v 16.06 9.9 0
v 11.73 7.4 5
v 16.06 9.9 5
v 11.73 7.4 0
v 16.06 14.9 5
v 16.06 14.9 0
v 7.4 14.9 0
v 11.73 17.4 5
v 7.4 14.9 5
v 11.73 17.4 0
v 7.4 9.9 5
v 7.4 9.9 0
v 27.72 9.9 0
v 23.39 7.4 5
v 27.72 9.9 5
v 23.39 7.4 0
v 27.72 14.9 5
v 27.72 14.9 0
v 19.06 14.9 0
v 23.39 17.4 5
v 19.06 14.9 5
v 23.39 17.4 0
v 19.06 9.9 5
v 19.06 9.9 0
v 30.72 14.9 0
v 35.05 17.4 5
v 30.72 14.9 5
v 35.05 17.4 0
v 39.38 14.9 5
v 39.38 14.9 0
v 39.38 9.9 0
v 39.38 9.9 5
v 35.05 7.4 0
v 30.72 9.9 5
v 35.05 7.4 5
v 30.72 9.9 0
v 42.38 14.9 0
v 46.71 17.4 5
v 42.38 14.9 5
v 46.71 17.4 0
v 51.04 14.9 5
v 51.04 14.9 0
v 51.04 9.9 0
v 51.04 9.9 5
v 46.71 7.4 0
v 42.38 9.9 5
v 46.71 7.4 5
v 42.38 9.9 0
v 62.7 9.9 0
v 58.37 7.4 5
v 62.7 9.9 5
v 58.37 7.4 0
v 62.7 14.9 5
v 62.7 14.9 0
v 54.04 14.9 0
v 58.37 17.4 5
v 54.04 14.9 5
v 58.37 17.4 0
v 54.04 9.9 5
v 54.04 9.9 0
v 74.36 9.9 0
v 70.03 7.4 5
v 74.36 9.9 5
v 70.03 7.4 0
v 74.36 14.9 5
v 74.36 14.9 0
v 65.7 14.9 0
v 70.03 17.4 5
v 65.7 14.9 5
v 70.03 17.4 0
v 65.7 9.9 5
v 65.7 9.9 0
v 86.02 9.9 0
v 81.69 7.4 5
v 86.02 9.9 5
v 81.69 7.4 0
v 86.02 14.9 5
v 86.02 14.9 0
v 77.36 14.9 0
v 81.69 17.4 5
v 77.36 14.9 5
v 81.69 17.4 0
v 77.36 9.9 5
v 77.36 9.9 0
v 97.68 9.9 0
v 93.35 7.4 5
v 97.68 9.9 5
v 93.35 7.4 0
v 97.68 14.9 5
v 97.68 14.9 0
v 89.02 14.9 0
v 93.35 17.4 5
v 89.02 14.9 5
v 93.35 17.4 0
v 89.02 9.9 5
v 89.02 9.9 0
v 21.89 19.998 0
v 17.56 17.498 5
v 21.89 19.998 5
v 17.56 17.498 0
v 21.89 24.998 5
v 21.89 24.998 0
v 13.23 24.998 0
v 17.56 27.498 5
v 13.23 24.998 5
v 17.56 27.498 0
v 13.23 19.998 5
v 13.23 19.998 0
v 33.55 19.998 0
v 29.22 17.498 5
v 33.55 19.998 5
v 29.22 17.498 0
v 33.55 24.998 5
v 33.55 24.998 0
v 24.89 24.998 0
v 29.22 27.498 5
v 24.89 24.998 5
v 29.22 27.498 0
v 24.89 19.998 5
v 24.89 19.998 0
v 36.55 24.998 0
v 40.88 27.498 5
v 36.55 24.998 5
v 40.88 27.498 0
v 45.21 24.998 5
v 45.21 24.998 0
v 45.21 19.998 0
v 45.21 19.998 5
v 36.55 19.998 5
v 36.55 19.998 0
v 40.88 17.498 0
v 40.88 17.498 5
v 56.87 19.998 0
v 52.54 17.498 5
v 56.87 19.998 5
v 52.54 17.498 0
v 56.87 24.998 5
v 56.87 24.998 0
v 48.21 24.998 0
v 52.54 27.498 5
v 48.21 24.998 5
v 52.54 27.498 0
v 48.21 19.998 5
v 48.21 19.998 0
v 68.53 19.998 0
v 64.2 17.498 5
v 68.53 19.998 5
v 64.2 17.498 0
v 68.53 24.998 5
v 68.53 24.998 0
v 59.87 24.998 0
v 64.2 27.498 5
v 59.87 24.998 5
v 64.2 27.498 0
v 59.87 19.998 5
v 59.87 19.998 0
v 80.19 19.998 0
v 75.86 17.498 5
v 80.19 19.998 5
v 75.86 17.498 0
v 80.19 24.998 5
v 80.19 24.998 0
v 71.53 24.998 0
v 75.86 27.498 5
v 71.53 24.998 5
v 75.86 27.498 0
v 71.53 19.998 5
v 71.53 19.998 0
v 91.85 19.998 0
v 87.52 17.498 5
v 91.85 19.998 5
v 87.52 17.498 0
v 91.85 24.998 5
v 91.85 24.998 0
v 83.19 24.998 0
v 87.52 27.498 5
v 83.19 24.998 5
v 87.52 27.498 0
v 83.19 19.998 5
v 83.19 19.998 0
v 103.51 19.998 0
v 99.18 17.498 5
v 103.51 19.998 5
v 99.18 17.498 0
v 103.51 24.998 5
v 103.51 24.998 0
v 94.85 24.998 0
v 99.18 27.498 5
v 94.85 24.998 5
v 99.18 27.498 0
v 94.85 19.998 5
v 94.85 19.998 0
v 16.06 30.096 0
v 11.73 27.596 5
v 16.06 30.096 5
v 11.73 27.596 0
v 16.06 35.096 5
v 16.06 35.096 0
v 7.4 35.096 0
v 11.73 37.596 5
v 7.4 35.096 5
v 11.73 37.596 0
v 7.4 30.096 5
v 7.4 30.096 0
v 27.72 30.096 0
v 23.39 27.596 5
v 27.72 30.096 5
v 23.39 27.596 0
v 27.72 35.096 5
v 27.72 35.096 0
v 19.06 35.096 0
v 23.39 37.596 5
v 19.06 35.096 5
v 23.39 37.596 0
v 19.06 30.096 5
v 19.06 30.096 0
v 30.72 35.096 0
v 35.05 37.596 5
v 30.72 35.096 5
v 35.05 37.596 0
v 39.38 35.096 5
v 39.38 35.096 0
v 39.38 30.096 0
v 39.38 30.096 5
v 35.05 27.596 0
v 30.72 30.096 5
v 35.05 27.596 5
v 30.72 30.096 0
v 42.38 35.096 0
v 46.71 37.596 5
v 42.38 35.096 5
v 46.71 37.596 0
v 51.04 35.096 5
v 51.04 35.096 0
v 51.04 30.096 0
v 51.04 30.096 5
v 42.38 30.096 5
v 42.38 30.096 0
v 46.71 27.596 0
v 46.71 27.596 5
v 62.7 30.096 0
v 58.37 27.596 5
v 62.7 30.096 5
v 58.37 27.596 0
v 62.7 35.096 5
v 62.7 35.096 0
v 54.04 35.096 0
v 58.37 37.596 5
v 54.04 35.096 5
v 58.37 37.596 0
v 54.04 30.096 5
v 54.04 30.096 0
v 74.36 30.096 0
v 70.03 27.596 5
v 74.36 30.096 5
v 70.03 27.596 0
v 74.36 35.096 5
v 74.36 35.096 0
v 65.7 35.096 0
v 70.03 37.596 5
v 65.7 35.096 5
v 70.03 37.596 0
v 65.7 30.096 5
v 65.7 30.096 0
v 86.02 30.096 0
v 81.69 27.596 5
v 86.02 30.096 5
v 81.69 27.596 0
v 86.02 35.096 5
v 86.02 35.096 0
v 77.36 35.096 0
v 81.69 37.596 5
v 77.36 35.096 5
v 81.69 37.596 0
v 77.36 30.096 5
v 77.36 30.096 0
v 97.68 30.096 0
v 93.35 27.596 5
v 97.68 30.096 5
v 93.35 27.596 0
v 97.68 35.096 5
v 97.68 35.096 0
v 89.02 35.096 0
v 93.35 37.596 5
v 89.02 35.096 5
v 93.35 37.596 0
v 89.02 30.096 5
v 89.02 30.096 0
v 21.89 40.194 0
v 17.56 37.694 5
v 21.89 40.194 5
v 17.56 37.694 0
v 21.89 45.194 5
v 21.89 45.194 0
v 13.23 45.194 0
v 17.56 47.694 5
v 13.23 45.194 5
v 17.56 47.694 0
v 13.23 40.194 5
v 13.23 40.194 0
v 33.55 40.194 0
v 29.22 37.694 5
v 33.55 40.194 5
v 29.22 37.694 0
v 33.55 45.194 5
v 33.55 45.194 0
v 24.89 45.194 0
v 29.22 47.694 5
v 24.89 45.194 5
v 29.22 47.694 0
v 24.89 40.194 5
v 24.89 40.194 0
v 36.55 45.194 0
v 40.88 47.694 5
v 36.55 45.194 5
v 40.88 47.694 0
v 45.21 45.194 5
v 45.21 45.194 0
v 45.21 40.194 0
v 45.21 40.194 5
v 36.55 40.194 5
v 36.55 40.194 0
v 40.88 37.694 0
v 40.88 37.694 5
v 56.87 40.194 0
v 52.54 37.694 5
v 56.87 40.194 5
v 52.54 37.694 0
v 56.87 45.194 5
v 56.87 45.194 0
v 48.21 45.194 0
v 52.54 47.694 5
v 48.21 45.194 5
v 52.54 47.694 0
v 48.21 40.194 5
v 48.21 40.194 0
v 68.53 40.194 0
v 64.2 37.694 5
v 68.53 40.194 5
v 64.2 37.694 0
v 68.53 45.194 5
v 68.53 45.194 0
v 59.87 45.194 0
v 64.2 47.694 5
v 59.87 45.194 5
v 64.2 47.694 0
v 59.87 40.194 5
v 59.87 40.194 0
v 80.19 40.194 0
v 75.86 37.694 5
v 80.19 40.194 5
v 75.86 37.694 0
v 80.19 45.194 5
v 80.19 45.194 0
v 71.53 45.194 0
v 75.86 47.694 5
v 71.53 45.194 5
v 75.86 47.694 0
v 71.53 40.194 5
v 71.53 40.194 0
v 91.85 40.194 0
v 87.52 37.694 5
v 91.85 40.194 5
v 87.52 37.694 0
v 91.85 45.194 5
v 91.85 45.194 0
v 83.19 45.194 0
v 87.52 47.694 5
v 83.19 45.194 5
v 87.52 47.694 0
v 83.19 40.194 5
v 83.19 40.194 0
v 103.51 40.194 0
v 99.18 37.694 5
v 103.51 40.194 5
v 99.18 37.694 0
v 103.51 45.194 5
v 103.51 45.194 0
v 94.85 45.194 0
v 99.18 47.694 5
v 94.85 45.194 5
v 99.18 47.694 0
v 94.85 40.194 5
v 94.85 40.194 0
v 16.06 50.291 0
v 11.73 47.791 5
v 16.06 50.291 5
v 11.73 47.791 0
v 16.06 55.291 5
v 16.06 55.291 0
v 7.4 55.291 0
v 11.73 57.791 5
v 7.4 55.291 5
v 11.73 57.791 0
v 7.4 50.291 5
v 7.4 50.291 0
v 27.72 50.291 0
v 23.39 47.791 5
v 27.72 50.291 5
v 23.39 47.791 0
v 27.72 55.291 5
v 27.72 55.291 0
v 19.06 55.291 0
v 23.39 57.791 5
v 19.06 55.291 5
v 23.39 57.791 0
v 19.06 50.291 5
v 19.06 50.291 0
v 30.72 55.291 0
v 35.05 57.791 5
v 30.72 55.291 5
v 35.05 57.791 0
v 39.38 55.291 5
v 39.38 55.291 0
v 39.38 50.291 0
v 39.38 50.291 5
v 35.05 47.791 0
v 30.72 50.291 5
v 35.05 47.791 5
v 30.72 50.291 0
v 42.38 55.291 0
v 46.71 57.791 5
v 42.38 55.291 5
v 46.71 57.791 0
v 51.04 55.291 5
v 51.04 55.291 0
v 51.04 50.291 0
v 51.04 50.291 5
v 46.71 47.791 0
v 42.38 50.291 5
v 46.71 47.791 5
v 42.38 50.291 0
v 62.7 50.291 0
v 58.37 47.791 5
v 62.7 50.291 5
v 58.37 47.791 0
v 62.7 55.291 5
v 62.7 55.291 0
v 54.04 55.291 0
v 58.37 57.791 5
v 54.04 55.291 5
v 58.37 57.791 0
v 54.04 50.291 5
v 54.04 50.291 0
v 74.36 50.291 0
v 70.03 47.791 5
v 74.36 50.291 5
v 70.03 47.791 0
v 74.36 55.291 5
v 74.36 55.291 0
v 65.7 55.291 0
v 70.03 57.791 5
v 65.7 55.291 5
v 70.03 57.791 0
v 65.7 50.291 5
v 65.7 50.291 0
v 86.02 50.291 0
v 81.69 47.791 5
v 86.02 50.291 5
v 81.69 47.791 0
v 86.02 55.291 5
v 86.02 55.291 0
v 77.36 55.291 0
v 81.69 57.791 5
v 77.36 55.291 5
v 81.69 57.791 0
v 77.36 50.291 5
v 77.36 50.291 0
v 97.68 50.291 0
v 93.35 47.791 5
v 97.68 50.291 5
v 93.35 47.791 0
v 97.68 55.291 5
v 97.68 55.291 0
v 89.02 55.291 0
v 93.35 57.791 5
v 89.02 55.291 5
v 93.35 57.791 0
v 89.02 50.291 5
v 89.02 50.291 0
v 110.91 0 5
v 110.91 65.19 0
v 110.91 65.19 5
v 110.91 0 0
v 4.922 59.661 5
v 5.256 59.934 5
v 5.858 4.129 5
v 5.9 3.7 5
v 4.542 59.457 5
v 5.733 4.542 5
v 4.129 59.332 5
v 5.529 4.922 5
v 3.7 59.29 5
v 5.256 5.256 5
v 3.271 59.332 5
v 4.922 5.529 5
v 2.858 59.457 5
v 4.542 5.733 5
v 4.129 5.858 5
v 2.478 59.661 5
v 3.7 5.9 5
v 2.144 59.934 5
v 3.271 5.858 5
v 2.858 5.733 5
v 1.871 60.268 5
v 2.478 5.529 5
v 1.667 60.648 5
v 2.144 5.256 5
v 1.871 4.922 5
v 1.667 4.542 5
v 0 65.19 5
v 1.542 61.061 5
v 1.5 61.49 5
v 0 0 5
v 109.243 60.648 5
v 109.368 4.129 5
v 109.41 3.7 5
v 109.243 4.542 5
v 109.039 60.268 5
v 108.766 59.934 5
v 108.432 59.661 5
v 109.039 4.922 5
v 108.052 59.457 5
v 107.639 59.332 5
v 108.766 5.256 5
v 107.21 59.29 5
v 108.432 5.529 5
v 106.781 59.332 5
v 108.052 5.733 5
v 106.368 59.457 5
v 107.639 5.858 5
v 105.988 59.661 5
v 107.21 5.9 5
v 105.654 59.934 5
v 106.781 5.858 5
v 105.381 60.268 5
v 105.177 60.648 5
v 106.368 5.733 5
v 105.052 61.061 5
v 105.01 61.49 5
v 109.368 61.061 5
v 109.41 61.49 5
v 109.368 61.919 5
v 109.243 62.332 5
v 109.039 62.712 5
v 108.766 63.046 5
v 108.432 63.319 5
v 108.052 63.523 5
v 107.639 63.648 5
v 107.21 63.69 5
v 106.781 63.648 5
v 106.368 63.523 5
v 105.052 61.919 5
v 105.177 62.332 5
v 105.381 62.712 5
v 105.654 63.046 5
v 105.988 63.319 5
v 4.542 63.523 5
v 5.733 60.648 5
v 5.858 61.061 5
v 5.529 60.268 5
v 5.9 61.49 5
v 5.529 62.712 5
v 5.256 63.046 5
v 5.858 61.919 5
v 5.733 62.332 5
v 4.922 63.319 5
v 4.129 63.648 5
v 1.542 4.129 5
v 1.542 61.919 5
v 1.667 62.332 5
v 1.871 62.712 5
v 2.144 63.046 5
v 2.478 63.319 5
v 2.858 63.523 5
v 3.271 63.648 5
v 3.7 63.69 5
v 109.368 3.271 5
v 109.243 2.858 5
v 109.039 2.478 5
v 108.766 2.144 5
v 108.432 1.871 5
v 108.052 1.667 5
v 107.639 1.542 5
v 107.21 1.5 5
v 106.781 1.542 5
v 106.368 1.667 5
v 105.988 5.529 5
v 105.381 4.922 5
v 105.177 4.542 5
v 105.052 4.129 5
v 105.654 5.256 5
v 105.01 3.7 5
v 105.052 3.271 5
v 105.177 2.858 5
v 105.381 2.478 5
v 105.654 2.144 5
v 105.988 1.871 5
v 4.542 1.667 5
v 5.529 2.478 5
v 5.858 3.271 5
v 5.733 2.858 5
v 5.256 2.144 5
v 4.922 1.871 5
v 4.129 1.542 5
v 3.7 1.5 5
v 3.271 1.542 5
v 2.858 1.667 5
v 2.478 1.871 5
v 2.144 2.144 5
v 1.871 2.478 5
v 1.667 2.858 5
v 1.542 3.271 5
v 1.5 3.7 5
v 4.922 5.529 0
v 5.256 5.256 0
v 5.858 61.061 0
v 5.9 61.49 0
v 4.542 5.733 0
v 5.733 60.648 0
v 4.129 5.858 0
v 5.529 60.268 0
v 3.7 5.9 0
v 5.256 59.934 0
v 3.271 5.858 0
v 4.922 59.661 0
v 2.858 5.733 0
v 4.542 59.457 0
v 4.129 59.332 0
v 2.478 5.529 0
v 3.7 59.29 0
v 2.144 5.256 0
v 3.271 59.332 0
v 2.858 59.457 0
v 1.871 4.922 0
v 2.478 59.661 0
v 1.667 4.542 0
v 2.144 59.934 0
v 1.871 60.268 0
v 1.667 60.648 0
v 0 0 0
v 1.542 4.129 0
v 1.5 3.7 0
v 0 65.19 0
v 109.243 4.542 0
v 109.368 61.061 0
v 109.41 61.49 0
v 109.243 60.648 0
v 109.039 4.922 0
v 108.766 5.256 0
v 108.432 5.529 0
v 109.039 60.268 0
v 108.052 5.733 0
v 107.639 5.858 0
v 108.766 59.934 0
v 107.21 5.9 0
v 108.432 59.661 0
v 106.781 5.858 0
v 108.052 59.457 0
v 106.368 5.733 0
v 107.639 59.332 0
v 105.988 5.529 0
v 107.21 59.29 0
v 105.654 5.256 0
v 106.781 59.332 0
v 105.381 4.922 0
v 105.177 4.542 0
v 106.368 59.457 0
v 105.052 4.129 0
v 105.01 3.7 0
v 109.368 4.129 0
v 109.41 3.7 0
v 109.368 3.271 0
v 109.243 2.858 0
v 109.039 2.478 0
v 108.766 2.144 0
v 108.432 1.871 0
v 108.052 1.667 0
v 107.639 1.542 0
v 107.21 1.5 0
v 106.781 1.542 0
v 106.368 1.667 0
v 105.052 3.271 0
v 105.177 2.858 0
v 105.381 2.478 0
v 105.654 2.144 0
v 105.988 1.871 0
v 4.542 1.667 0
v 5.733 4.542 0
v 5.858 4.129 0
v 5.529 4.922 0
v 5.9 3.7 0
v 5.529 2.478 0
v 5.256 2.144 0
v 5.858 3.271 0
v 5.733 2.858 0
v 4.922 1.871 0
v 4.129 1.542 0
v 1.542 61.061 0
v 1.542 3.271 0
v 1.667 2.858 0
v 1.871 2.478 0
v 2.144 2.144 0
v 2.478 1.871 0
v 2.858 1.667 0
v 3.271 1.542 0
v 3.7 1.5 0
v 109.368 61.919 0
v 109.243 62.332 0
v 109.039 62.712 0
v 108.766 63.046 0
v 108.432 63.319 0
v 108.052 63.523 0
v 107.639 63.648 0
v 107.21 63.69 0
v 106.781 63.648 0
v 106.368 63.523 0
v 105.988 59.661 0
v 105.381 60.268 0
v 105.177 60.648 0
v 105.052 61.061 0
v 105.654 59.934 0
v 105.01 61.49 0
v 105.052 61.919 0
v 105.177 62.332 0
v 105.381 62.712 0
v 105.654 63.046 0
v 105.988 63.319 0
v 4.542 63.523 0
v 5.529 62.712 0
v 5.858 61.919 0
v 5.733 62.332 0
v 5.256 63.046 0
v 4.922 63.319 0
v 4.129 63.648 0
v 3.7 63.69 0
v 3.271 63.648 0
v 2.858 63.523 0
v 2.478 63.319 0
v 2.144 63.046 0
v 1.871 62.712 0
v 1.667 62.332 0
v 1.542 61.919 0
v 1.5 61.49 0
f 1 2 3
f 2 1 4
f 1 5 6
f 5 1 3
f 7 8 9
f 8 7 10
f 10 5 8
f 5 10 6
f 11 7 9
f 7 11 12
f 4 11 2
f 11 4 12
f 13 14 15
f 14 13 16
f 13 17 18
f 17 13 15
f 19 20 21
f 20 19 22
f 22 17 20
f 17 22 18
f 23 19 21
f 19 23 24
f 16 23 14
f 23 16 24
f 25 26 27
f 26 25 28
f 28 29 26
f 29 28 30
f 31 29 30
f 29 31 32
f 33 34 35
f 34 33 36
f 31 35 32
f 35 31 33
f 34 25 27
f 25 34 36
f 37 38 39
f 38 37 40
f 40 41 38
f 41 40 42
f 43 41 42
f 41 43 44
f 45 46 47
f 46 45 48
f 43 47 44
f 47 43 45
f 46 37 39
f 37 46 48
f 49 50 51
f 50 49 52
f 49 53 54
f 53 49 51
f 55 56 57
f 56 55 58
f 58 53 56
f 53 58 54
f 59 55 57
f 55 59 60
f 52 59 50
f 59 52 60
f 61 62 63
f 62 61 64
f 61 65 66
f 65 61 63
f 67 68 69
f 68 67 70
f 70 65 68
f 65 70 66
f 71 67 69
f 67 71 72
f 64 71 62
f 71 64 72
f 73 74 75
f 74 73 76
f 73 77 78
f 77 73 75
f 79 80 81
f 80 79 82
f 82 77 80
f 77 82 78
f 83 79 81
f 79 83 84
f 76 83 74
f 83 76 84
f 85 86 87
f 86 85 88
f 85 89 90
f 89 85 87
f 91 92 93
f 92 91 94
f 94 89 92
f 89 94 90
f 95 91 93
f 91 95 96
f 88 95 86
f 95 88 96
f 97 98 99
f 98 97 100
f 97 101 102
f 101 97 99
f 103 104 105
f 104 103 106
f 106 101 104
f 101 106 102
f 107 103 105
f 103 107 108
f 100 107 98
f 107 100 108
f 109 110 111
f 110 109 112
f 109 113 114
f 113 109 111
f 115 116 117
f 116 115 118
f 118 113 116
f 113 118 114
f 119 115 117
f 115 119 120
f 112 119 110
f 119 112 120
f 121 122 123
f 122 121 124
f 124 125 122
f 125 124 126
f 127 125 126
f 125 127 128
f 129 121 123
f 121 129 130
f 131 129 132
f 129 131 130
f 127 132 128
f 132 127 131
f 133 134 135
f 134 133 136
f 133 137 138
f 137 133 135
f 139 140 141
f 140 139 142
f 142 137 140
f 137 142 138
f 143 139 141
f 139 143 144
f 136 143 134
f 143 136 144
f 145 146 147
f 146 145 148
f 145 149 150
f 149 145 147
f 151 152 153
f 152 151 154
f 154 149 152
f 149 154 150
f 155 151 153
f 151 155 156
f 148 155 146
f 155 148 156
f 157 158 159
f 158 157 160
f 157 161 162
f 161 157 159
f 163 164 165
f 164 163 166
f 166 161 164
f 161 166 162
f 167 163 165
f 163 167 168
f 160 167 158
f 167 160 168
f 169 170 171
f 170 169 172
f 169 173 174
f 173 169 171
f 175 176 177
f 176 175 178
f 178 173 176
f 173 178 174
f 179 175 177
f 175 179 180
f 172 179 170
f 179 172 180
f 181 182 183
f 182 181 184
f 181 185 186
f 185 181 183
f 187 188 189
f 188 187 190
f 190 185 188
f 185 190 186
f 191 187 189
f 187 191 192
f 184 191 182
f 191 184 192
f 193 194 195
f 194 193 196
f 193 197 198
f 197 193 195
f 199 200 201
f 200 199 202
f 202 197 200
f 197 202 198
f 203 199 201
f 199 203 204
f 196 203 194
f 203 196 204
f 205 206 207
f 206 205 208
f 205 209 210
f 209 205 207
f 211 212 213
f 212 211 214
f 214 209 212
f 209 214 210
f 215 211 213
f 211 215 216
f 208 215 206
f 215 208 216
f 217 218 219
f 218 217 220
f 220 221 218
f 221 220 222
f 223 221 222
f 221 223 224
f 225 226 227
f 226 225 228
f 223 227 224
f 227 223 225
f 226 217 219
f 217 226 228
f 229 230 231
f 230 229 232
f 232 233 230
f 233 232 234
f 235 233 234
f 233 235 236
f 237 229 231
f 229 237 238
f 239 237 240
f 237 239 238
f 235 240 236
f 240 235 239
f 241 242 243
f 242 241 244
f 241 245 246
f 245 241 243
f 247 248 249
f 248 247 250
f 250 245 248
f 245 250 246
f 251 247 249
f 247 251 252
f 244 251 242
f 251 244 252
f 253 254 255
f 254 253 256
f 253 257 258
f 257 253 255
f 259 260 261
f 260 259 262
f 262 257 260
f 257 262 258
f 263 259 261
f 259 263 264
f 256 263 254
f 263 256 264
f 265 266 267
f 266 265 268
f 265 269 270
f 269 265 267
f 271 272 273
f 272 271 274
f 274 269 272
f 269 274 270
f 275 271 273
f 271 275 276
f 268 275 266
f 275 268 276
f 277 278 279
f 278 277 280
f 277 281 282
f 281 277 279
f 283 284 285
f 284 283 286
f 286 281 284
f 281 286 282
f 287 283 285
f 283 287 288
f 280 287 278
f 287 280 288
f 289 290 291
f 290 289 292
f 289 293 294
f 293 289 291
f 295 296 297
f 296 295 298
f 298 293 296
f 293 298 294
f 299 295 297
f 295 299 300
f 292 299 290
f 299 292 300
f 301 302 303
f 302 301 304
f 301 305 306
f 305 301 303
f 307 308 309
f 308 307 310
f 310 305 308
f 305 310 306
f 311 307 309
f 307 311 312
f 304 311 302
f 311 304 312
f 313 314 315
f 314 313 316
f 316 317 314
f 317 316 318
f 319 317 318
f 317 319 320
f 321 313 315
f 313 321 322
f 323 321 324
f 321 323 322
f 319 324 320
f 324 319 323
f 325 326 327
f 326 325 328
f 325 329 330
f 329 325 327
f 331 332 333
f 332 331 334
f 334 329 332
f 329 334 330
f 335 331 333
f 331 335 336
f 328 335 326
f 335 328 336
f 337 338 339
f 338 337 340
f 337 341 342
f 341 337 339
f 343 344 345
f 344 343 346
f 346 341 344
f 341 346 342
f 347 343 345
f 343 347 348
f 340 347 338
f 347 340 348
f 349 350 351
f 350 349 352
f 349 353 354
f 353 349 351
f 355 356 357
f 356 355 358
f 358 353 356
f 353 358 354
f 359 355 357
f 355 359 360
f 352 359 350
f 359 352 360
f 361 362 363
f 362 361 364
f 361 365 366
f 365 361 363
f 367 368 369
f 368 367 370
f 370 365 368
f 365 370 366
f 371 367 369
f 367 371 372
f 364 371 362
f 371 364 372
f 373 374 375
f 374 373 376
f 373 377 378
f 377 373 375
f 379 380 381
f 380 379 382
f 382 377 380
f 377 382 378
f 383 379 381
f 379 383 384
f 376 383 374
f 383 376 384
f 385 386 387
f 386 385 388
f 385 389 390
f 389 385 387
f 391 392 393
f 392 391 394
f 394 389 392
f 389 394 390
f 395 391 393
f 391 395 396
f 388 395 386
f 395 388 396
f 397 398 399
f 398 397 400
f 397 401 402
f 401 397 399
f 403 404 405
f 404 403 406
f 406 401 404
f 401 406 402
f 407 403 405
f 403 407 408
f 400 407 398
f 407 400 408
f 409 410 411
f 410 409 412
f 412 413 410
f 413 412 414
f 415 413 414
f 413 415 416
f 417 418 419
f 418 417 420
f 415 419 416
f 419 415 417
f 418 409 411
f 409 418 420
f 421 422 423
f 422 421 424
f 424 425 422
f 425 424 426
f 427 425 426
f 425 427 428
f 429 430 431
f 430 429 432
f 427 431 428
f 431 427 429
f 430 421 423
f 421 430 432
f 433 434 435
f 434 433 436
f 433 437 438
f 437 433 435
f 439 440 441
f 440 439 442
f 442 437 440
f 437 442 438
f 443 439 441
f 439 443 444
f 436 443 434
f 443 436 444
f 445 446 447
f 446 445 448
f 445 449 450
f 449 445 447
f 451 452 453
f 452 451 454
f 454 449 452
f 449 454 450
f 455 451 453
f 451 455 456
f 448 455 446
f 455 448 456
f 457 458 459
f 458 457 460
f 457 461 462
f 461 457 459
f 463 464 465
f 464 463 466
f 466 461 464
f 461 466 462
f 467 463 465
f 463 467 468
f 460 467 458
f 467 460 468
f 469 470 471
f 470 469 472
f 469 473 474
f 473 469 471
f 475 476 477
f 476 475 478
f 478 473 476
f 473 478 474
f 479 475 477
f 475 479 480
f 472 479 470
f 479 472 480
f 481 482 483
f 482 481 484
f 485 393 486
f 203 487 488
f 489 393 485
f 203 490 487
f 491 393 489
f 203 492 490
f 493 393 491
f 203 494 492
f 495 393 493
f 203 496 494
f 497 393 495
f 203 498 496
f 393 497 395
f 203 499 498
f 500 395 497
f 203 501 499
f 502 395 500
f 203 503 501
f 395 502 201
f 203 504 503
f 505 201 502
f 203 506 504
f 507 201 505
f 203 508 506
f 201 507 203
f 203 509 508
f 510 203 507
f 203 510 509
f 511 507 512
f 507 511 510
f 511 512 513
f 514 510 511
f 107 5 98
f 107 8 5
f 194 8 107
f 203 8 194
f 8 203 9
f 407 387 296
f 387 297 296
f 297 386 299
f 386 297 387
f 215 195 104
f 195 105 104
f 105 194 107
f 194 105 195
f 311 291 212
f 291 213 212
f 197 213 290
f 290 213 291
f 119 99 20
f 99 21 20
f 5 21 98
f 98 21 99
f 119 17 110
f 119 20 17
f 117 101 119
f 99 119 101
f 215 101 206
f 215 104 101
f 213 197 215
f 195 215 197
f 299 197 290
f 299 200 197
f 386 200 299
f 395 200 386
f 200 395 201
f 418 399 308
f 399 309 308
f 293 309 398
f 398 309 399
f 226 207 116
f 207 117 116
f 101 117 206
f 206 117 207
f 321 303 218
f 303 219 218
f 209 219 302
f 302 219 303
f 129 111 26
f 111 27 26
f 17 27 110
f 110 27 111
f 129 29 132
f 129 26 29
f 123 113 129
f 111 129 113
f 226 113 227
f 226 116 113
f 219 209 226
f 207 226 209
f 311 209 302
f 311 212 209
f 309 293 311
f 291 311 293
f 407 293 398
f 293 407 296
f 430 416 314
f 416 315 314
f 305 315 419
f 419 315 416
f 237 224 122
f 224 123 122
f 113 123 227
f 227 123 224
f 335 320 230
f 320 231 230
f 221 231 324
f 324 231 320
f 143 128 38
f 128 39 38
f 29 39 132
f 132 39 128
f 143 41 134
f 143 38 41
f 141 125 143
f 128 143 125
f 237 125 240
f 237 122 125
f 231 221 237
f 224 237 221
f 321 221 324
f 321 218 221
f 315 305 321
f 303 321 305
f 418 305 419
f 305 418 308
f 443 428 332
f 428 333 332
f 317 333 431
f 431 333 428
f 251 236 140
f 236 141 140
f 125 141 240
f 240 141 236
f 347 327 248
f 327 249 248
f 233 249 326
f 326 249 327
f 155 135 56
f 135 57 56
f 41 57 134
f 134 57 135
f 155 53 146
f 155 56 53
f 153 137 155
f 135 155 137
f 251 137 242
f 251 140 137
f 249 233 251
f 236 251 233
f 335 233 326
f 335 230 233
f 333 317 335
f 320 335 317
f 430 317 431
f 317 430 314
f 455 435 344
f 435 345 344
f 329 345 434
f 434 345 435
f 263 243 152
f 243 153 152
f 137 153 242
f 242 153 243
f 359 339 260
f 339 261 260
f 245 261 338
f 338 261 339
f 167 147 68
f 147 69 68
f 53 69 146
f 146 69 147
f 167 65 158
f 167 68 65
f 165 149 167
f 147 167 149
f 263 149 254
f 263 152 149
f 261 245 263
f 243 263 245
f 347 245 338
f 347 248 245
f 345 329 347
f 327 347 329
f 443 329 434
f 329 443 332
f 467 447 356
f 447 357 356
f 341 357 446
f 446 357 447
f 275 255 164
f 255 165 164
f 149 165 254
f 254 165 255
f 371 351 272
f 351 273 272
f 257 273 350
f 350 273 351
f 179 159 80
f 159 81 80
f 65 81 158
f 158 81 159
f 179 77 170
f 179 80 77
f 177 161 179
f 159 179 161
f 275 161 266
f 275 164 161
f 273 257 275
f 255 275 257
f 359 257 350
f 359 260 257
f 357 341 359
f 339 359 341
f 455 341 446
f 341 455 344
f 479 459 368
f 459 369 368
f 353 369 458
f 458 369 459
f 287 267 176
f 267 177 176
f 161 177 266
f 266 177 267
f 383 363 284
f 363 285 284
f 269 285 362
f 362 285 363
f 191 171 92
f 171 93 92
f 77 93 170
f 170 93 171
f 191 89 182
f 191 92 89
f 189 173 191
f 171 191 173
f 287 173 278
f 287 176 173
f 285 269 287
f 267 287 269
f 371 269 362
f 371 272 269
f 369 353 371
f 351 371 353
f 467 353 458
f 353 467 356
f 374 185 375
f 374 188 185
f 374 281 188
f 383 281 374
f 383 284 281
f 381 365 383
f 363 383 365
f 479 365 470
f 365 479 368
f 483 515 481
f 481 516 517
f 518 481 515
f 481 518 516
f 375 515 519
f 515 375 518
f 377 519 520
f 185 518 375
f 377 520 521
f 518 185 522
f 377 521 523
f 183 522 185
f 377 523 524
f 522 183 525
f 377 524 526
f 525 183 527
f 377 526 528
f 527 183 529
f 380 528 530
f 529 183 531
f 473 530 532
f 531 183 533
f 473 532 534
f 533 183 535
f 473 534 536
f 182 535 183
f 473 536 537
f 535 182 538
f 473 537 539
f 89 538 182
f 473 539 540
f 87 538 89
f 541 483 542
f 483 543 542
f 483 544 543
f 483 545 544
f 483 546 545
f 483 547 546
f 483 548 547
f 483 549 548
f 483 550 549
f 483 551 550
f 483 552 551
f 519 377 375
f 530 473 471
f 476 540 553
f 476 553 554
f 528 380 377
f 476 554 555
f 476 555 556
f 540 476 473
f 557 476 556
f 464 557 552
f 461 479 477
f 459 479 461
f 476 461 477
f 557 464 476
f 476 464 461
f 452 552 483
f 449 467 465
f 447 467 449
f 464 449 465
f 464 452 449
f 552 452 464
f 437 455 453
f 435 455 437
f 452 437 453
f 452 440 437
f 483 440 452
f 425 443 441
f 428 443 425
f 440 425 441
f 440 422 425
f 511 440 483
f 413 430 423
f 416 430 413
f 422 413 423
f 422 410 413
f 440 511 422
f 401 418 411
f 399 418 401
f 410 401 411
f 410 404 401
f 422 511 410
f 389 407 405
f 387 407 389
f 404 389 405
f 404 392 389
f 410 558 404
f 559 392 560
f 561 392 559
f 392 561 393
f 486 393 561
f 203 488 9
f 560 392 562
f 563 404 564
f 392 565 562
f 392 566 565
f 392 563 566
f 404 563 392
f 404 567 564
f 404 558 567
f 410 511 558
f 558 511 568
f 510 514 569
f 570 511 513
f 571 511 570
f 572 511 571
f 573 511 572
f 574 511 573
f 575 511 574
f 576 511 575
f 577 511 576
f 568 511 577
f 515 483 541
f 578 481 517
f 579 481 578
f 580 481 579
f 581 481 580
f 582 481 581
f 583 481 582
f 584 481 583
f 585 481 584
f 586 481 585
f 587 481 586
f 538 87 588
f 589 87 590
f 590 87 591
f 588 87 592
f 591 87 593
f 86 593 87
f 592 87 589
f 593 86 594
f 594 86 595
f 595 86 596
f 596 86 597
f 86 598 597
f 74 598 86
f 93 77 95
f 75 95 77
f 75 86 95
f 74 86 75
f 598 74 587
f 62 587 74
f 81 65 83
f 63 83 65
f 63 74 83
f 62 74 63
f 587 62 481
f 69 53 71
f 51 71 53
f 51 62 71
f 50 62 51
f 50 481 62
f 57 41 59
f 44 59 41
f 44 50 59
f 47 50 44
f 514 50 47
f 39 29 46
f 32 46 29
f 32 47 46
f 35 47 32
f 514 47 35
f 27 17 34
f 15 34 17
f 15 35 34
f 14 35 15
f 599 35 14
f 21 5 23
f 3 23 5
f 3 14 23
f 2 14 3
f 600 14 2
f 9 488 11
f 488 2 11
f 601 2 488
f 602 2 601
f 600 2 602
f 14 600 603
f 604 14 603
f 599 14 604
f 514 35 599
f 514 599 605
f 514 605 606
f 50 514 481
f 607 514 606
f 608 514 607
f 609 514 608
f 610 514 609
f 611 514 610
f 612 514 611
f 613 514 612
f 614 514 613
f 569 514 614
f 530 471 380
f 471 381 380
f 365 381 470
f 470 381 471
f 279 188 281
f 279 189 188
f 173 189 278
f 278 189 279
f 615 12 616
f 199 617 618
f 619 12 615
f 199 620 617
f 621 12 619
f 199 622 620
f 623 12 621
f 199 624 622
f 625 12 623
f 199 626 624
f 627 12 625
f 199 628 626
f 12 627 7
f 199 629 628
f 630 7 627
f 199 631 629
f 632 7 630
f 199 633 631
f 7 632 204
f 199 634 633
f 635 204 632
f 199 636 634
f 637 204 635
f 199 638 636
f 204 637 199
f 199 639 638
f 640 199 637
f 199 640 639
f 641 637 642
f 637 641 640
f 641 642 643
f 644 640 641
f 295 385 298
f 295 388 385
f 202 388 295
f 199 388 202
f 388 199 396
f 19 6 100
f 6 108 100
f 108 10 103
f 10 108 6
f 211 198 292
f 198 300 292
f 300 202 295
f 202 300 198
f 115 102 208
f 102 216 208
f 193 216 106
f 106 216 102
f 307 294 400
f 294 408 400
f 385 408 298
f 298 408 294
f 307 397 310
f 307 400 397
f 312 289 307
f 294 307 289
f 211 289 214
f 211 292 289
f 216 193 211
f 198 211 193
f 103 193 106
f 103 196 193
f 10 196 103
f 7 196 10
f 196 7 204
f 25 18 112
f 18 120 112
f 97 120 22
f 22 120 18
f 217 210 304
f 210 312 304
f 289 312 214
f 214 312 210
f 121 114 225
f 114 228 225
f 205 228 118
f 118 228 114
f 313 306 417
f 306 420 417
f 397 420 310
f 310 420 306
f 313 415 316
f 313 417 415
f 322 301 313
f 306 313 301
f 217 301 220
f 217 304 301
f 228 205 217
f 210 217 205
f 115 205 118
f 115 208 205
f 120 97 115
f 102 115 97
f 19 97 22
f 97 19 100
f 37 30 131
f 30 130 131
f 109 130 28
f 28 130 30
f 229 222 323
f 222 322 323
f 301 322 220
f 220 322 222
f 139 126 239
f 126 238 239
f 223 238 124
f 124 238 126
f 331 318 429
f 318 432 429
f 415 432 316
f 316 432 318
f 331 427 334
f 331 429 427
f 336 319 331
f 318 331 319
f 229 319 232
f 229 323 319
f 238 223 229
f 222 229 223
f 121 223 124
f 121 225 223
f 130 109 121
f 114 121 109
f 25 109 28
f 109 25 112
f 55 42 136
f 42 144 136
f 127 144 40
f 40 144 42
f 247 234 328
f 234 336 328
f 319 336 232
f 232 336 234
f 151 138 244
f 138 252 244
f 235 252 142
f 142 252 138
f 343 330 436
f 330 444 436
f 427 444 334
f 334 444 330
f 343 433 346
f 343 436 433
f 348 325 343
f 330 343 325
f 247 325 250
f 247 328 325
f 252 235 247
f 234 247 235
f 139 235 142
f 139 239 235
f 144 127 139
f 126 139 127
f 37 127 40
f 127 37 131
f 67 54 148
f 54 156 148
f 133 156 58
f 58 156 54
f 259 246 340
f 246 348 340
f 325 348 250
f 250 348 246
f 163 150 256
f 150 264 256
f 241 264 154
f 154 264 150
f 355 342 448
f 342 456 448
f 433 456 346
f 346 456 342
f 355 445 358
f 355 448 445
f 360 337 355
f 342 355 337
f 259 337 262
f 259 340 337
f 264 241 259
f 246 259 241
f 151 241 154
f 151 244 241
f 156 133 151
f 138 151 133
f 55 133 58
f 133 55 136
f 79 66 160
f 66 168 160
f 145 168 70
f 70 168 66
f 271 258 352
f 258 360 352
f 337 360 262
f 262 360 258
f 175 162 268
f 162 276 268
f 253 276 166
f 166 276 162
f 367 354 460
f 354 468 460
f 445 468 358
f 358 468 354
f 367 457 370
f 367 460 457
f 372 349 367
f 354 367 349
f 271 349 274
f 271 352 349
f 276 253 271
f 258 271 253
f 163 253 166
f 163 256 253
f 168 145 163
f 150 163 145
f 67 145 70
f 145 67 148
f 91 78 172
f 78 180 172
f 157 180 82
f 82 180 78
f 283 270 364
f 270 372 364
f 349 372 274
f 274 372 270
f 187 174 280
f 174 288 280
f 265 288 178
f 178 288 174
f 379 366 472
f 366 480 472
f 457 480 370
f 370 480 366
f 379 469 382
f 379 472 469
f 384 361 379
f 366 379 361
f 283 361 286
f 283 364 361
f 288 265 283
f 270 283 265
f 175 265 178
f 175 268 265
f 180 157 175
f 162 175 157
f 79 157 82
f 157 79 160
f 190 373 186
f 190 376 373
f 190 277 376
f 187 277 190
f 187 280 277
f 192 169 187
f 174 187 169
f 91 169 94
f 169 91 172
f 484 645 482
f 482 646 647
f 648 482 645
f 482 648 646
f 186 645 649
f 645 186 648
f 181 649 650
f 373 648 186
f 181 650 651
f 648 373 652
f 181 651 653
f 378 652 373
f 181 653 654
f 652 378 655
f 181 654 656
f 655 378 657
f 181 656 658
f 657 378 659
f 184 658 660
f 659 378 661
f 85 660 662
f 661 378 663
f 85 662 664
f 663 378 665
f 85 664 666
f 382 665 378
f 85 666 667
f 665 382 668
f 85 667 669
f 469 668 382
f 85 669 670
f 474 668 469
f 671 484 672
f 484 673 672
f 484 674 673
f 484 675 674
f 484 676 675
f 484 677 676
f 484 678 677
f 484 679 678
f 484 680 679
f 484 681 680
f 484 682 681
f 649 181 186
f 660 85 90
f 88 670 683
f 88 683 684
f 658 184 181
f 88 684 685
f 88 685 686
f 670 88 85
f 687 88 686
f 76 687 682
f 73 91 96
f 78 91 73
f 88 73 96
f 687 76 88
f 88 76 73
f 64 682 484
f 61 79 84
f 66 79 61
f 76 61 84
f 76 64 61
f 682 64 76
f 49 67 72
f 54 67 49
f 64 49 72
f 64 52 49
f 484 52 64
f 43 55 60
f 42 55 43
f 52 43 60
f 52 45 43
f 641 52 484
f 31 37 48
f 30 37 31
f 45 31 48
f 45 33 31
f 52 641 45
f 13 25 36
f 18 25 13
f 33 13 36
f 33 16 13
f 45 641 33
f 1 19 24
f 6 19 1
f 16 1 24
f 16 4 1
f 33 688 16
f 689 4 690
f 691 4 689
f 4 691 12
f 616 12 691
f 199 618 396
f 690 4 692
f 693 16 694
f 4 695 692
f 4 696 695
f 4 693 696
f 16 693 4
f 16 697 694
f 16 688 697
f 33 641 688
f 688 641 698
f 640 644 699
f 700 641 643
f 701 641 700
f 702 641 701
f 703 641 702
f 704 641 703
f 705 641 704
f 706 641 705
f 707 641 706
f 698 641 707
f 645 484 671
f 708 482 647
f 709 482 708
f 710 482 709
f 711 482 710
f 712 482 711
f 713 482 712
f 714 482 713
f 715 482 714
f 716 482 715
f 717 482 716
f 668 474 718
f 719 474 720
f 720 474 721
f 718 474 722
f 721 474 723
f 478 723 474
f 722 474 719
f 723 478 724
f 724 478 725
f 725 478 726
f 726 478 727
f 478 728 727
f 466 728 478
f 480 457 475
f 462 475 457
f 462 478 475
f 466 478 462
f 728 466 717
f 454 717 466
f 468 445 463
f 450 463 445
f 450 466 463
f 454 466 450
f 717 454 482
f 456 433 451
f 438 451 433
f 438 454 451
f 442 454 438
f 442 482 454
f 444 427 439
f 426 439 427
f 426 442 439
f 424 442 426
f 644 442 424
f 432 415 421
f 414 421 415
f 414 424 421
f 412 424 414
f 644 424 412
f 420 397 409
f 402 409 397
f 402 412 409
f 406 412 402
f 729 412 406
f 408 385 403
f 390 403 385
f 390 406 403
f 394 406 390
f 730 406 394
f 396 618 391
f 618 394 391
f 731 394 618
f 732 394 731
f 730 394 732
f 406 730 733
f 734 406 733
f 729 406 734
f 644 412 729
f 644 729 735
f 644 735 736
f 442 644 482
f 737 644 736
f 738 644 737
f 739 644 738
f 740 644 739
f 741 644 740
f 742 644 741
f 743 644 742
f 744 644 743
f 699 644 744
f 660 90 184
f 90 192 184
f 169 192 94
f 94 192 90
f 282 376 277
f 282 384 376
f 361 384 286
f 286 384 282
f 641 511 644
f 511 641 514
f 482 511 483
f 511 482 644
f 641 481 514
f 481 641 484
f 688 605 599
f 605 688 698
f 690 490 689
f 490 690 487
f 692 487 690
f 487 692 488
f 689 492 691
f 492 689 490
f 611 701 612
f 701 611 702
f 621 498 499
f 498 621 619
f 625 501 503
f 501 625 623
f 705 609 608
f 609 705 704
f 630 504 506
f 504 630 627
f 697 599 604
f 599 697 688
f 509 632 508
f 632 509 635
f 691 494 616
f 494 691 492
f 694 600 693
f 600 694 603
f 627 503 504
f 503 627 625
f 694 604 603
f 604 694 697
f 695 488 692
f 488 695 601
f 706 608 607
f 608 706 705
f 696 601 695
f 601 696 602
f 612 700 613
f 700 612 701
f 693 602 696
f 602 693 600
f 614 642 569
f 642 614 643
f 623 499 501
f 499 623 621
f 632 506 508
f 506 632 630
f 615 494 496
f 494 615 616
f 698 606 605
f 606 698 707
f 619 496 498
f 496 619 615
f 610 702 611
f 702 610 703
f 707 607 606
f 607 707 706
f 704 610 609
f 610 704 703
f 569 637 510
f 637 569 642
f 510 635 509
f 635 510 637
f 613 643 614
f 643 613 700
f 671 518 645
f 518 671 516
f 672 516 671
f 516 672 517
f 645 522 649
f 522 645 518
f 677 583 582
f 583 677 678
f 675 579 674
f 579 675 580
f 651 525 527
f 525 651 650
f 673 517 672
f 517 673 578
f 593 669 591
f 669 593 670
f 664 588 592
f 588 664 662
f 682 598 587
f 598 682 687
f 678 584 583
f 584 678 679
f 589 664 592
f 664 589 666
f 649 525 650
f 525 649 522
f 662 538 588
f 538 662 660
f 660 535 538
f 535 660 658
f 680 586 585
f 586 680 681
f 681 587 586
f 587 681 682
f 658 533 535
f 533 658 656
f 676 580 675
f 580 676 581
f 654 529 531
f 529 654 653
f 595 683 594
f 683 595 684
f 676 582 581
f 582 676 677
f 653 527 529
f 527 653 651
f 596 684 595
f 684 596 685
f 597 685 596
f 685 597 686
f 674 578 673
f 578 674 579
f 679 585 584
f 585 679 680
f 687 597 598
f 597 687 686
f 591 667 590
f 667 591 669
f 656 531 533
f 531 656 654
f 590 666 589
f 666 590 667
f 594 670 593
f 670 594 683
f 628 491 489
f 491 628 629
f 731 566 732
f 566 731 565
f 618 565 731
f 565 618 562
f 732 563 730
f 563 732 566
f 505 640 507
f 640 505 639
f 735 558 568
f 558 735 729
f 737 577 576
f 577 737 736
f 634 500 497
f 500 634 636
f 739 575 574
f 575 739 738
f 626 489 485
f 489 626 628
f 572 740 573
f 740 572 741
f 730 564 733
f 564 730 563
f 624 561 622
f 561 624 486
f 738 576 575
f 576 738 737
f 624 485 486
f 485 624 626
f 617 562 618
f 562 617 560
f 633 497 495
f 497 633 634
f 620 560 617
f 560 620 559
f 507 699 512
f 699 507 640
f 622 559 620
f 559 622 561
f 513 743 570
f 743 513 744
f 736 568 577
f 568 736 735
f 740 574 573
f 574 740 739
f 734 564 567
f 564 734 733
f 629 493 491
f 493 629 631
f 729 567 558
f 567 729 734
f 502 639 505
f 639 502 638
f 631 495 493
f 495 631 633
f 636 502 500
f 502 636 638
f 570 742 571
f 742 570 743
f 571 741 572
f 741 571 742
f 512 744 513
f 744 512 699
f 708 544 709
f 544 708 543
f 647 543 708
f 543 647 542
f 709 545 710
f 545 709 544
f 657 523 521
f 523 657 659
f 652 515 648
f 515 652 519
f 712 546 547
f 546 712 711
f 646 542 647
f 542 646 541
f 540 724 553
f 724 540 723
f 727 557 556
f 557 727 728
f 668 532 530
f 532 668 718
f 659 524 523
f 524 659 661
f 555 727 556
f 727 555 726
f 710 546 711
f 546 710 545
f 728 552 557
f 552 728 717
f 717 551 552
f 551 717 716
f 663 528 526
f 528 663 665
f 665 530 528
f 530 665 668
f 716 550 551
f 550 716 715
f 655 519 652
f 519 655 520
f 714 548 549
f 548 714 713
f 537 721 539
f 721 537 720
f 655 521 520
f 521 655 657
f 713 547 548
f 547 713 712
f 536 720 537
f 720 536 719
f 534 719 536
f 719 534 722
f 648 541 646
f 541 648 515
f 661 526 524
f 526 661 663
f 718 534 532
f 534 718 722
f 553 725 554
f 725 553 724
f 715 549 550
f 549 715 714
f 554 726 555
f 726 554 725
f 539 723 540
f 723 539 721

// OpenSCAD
$fn = 32;

// ----------------------------------------------------------------------
// Honeycomb panel: 110.91 x 65.19 mm, 40 cells of 10 mm
// ----------------------------------------------------------------------

// --- parameters (mm) ---
panel_w = 110.91;         // panel width
panel_d = 65.19;          // panel depth
thick = 5;                // panel thickness
cell_r = 5;               // hex cell circumradius
pitch = 11.66;            // hex cell pitch (centre to centre)
web = 3;                  // web between the cells
columns = 8;              // columns of cells
rows = 5;                 // rows of cells
cell_count = 40;          // total cells
shift_x = 11.73;          // first cell offset in x
shift_y = 12.4;           // first cell offset in y
mount_d = 4.4;            // corner mounting holes
hole_off = 3.7;           // mounting hole offset from the corners

difference() {
  union() {
    cube([panel_w, panel_d, thick]);
  }
  /* hexagonal cells, point-up, cut right through the plate */
  for (row = [0 : rows - 1]) {
    for (col = [0 : columns - 1]) {
      translate([shift_x + col * pitch + (row % 2) * pitch / 2, shift_y + row * pitch * 0.866025, -2.5]) rotate([0, 0, 30]) cylinder(h = thick + 5, d = 2 * cell_r, $fn = 6);
    }
  }
  /* corner mounting holes, clear of the outer cell web */
  translate([3.7, 3.7, -2.5]) cylinder(h = thick + 5, d = mount_d);
  translate([107.21, 3.7, -2.5]) cylinder(h = thick + 5, d = mount_d);
  translate([3.7, 61.49, -2.5]) cylinder(h = thick + 5, d = mount_d);
  translate([107.21, 61.49, -2.5]) cylinder(h = thick + 5, d = mount_d);
}
